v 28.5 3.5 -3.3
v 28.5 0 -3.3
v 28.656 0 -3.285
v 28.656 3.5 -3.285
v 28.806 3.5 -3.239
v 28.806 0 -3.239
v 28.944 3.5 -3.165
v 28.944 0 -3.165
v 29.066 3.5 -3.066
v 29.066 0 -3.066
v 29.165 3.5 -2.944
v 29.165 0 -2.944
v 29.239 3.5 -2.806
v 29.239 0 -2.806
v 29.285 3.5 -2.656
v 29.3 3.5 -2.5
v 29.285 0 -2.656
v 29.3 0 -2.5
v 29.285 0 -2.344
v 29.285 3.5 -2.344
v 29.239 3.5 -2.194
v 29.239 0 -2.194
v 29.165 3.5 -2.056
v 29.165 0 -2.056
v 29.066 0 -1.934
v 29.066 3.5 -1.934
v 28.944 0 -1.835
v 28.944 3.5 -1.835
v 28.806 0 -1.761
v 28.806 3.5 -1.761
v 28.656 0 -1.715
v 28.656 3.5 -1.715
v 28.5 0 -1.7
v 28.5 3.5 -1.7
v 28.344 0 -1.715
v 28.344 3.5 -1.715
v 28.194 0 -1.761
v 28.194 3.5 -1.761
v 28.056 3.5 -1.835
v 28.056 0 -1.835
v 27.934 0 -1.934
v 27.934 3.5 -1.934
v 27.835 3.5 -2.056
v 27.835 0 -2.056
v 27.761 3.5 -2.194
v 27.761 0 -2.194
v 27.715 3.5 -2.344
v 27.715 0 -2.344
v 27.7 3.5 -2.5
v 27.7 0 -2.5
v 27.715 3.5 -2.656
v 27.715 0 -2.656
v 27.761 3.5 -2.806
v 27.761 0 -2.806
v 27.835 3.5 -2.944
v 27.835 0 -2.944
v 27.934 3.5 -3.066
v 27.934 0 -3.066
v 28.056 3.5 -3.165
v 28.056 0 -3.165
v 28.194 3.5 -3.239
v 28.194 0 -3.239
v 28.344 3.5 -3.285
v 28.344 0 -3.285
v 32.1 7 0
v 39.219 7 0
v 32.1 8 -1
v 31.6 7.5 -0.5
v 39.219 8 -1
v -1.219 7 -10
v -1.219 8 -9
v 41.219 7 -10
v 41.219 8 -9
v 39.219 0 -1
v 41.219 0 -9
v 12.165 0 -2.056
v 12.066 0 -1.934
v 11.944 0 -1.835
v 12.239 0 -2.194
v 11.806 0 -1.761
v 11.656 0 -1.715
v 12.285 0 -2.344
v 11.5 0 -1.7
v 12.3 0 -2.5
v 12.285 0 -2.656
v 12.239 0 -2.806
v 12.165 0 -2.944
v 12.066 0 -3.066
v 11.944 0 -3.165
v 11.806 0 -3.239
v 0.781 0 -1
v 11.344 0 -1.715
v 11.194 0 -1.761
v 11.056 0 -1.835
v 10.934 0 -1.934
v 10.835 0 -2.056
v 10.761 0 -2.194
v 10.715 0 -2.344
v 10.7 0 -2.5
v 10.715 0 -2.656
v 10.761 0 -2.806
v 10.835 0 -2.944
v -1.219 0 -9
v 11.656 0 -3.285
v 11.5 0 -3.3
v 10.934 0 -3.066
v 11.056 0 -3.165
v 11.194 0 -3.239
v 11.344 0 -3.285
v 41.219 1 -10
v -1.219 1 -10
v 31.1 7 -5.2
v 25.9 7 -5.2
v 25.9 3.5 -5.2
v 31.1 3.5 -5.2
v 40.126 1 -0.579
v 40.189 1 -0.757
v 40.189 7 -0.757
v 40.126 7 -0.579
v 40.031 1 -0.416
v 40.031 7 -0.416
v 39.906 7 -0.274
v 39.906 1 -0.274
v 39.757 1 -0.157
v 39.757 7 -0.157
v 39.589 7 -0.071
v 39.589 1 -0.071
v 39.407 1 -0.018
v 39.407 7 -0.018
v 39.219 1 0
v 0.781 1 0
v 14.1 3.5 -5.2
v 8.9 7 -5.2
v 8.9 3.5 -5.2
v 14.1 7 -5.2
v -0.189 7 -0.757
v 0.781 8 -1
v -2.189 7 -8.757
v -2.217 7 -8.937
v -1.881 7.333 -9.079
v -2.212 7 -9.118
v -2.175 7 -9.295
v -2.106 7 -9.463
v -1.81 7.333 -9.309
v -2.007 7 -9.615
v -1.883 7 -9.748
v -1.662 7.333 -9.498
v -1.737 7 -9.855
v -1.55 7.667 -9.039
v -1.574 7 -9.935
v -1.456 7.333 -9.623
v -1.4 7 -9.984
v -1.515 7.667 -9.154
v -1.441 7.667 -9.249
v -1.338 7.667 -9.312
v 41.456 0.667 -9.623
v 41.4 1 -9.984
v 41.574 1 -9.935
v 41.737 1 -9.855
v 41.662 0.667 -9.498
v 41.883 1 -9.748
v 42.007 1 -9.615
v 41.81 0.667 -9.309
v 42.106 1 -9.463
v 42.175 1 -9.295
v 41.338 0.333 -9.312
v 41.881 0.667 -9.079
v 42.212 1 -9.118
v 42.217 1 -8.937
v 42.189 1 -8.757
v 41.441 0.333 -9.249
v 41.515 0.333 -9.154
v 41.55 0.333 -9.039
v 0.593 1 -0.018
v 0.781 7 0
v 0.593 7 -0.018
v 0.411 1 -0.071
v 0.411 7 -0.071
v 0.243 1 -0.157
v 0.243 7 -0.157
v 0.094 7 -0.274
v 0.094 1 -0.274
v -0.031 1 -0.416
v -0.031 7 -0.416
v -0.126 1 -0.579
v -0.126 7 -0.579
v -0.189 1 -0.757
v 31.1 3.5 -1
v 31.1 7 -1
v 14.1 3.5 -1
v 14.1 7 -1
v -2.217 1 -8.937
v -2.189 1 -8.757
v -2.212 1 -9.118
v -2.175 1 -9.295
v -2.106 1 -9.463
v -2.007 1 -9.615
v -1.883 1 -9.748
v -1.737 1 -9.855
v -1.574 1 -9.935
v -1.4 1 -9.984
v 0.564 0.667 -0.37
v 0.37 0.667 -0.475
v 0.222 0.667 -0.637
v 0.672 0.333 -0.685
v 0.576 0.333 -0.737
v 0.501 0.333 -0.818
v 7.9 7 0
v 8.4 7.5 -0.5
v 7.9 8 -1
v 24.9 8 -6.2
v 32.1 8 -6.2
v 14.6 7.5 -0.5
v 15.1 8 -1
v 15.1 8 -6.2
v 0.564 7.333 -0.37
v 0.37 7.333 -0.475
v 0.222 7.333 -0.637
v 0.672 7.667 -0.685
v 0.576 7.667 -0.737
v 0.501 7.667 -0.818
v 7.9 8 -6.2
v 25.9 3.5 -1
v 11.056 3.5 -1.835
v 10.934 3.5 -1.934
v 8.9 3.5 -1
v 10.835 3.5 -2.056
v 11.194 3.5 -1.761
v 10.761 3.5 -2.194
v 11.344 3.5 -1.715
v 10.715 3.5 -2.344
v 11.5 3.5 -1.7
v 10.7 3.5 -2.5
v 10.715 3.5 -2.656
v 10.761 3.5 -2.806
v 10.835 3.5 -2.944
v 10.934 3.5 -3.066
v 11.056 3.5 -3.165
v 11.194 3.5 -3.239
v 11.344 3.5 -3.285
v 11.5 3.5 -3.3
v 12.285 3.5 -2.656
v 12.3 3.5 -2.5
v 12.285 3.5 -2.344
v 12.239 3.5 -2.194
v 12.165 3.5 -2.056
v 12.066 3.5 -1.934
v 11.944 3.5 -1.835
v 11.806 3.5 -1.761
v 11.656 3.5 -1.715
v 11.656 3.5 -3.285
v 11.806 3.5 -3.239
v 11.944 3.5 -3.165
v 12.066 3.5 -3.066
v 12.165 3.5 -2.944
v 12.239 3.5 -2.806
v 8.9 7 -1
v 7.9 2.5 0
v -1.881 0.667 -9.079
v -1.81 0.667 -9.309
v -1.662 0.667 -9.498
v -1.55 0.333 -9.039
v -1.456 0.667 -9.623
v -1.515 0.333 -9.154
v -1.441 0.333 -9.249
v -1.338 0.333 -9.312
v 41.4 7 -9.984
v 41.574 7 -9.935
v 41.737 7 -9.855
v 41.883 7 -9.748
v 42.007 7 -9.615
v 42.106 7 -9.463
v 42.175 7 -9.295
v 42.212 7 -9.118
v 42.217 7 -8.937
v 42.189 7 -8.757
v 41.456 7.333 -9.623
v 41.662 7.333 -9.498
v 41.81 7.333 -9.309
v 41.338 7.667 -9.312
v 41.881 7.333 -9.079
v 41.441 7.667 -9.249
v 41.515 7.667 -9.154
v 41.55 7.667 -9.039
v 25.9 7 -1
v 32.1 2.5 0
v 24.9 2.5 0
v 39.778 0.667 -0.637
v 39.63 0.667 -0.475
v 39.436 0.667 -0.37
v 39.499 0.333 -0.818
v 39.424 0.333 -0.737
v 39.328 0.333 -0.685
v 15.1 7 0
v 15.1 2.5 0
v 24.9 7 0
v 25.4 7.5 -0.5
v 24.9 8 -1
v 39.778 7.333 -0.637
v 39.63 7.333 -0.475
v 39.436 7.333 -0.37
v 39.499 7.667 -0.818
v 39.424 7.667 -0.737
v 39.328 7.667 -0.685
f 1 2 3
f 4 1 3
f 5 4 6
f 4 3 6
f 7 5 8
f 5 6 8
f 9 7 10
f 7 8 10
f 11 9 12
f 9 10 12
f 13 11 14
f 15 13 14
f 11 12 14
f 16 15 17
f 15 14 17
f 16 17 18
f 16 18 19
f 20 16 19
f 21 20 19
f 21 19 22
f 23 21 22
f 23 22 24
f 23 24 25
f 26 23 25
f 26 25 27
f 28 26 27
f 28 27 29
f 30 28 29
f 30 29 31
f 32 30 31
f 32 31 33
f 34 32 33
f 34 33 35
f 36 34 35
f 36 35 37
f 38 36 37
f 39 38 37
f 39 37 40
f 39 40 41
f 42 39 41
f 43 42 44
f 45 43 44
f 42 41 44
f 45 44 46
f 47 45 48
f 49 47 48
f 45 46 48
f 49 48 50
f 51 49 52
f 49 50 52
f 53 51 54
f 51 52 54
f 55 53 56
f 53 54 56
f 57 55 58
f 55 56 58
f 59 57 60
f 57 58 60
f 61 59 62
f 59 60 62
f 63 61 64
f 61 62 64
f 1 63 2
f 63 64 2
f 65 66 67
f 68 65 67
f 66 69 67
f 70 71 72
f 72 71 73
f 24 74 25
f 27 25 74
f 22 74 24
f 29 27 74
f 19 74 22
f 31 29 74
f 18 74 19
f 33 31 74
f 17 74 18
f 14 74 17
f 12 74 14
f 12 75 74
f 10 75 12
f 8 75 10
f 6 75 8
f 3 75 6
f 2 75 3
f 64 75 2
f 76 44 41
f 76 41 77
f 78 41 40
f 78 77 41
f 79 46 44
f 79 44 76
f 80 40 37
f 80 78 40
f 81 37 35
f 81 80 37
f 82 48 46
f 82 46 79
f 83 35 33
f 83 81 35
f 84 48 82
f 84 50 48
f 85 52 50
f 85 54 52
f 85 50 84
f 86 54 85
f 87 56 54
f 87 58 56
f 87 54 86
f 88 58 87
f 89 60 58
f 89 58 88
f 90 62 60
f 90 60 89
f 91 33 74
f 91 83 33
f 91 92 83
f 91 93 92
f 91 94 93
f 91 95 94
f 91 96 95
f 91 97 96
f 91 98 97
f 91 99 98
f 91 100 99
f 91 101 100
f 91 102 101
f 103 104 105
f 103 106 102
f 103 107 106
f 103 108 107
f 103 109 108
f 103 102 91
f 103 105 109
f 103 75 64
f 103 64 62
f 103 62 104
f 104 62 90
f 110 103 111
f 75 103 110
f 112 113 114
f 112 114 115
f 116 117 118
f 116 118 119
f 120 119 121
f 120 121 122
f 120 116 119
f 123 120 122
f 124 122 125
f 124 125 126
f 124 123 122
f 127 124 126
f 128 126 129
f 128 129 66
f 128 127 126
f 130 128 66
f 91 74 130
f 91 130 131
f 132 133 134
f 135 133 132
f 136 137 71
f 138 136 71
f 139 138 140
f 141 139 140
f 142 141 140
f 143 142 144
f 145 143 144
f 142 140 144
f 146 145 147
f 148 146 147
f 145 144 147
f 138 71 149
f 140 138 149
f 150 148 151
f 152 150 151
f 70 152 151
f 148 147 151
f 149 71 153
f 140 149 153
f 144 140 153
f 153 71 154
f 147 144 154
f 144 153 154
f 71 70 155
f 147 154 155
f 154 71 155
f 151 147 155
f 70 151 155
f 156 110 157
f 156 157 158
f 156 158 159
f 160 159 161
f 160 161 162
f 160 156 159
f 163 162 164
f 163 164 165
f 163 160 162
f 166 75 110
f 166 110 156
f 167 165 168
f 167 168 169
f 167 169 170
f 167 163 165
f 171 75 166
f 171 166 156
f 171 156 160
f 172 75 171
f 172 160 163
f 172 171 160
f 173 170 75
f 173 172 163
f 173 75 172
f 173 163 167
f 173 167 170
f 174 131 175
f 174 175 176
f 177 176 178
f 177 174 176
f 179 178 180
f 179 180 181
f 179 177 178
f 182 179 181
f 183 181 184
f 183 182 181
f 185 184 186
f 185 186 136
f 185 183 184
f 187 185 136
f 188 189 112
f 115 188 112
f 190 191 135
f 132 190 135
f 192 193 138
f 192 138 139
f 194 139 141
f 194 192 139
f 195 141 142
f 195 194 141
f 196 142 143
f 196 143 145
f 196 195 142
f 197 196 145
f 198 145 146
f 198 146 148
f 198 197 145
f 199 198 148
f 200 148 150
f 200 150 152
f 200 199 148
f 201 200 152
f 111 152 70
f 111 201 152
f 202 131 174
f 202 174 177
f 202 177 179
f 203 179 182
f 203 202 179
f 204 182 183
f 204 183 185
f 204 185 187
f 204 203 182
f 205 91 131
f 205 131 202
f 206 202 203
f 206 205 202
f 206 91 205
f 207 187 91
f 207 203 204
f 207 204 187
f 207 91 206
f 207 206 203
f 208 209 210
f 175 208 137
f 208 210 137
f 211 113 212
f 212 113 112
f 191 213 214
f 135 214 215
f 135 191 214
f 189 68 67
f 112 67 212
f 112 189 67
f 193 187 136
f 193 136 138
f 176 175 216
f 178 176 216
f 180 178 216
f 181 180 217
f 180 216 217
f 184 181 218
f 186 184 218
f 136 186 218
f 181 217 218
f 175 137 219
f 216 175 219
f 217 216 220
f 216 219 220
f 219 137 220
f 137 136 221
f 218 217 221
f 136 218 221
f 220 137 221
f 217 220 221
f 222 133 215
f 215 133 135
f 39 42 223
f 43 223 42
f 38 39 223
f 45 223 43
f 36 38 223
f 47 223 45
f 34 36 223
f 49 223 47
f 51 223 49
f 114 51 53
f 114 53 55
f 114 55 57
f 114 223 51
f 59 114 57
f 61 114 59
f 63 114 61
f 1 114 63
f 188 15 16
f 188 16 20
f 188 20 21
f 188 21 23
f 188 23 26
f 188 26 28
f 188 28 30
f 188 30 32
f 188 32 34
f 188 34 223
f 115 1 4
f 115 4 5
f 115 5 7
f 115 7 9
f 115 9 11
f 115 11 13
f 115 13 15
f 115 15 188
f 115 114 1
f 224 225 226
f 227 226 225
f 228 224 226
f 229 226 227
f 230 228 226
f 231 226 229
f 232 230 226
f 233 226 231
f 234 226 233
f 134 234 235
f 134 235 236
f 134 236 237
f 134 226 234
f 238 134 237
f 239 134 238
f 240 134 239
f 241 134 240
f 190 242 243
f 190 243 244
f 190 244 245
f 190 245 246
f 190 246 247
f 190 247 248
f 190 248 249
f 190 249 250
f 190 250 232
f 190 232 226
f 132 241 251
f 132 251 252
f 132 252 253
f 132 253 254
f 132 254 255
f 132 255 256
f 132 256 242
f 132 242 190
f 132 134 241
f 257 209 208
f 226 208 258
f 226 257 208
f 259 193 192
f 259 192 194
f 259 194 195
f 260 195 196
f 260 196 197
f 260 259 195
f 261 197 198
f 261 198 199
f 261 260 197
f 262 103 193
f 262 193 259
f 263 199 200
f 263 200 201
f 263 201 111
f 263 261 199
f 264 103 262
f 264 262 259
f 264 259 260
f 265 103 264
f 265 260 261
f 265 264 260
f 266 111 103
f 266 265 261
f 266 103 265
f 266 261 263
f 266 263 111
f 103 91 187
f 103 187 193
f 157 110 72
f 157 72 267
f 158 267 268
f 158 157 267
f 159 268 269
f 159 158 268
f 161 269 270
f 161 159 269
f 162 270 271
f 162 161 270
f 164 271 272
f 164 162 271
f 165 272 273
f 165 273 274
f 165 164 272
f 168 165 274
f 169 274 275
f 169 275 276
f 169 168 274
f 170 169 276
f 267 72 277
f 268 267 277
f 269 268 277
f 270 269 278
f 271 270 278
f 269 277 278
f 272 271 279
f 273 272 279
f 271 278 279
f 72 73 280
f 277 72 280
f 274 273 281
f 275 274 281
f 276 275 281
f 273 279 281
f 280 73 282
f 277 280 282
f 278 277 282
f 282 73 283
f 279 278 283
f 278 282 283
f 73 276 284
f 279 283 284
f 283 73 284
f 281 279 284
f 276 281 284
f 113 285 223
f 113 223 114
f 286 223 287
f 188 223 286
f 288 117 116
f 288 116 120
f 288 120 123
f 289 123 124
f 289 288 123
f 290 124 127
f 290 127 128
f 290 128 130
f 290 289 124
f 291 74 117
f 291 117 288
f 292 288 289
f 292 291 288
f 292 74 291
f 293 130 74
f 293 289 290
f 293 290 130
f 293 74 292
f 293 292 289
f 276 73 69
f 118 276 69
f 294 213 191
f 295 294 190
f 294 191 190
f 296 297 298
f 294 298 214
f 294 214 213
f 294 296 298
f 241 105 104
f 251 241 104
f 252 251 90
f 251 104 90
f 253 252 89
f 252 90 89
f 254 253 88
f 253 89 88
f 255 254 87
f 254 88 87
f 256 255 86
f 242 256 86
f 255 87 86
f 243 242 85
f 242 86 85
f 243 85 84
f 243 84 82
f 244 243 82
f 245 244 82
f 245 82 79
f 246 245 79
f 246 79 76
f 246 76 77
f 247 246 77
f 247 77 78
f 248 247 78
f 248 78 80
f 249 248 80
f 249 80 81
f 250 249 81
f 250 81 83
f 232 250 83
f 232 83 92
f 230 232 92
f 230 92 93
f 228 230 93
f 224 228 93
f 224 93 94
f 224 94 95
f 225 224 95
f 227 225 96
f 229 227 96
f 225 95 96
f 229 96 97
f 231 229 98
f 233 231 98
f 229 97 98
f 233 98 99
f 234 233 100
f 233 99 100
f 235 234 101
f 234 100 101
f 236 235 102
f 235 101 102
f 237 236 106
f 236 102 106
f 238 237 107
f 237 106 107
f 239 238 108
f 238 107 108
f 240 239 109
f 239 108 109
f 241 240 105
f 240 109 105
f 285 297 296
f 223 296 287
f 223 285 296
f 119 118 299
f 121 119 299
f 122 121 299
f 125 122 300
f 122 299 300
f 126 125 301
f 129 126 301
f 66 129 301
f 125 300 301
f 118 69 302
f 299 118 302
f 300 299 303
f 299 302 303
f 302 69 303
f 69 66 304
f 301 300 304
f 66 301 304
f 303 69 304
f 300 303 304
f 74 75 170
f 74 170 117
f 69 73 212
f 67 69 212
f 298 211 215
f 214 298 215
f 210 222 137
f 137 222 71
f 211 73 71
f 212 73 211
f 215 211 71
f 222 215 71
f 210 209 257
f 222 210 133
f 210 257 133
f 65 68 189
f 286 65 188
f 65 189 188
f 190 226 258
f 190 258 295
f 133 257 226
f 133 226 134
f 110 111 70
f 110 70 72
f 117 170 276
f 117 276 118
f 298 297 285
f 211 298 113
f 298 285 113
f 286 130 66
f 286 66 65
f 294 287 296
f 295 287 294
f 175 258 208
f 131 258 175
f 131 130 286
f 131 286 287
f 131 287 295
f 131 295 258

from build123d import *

# Parameters (mm, degrees)
RESSALTO_EXTRUS_O2_DEPTH = 8
ESBO_O4_W                = 5.2
ESBO_O4_H                = 5.2
CORTE_EXTRUS_O1_DEPTH    = 4.5
CHANFRO1_SIZE            = 1
CHANFRO2_SIZE            = 1
FURO_ROSCADO_DE_M21_D    = 1.6


with BuildPart() as part:
    # Esboço2 → Ressalto-extrusão2 (new body)
    with BuildSketch(Plane(origin=(0, 0, 0), x_dir=(1, 0, 0), z_dir=(0, 1, 0))):
        with BuildLine():
            Line((-0.189366094, 0.757464375), (-2.189366094, 8.757464375))
            ThreePointArc((-2.189366094, 8.757464375), (-2.007429032, 9.615412209), (-1.219223594, 10))
            Line((-1.219223594, 10), (41.219223594, 10))
            ThreePointArc((41.219223594, 10), (42.007429032, 9.615412209), (42.189366094, 8.757464375))
            Line((42.189366094, 8.757464375), (40.189366094, 0.757464375))
            ThreePointArc((40.189366094, 0.757464375), (39.834635803, 0.211794562), (39.219223594, 0))
            Line((39.219223594, 0), (0.780776406, 0))
            ThreePointArc((0.780776406, 0), (0.165364197, 0.211794562), (-0.189366094, 0.757464375))
        make_face()
    extrude(amount=RESSALTO_EXTRUS_O2_DEPTH)

    # Esboço4 → Corte-extrusão1 (cut)
    with BuildSketch(Plane(origin=(0, 8, 0), x_dir=(1, 0, 0), z_dir=(0, 1, 0))):
        with Locations((28.5, 2.6)):
            Rectangle(ESBO_O4_W, ESBO_O4_H)
        with Locations((11.5, 2.6)):
            Rectangle(ESBO_O4_W, ESBO_O4_H)
    extrude(amount=-CORTE_EXTRUS_O1_DEPTH, mode=Mode.SUBTRACT)

    # Chanfro1
    chanfro1_edges = [part.edges().sort_by_distance(p)[0] for p in [
        (-2.007429032, 8, -9.615412209),
        (-1.189366094, 8, -4.757464375),
        (0.165364197, 8, -0.211794562),
        (4.840388203, 8, 0),
        (20, 8, 0),
        (35.159611797, 8, 0),
        (39.834635803, 8, -0.211794562),
        (41.189366094, 8, -4.757464375),
        (31.1, 8, -2.6),
        (28.5, 8, -5.2),
        (25.9, 8, -2.6),
        (8.9, 8, -2.6),
        (14.1, 8, -2.6),
        (11.5, 8, -5.2),
        (42.007429032, 8, -9.615412209),
        (20, 8, -10),
    ]]
    chamfer(chanfro1_edges, length=CHANFRO1_SIZE - 0.0001)  # a hair under: the kernel refuses the full size

    # Chanfro2
    chanfro2_edges = [part.edges().sort_by_distance(p)[0] for p in [
        (-1.189366094, 0, -4.757464375),
        (-2.007429032, 0, -9.615412209),
        (20, 0, -10),
        (42.007429032, 0, -9.615412209),
        (31.1, 5.25005, 0),
        (25.9, 5.25005, 0),
        (28.5, 3.5, 0),
        (8.9, 5.25005, 0),
        (14.1, 5.25005, 0),
        (11.5, 3.5, 0),
        (41.189366094, 0, -4.757464375),
        (39.834635803, 0, -0.211794562),
        (20, 0, 0),
        (0.165364197, 0, -0.211794562),
    ]]
    chamfer(chanfro2_edges, length=CHANFRO2_SIZE - 0.0001)  # a hair under: the kernel refuses the full size

    # Furo roscado de M21 (through all)
    with Locations(Plane(origin=(28.5, 3.5, -2.5), x_dir=(0, 0, 1), z_dir=(0, 1, 0))):
        with Locations((0, 0), (0, -17)):
            Hole(FURO_ROSCADO_DE_M21_D / 2)


solid = part.part
